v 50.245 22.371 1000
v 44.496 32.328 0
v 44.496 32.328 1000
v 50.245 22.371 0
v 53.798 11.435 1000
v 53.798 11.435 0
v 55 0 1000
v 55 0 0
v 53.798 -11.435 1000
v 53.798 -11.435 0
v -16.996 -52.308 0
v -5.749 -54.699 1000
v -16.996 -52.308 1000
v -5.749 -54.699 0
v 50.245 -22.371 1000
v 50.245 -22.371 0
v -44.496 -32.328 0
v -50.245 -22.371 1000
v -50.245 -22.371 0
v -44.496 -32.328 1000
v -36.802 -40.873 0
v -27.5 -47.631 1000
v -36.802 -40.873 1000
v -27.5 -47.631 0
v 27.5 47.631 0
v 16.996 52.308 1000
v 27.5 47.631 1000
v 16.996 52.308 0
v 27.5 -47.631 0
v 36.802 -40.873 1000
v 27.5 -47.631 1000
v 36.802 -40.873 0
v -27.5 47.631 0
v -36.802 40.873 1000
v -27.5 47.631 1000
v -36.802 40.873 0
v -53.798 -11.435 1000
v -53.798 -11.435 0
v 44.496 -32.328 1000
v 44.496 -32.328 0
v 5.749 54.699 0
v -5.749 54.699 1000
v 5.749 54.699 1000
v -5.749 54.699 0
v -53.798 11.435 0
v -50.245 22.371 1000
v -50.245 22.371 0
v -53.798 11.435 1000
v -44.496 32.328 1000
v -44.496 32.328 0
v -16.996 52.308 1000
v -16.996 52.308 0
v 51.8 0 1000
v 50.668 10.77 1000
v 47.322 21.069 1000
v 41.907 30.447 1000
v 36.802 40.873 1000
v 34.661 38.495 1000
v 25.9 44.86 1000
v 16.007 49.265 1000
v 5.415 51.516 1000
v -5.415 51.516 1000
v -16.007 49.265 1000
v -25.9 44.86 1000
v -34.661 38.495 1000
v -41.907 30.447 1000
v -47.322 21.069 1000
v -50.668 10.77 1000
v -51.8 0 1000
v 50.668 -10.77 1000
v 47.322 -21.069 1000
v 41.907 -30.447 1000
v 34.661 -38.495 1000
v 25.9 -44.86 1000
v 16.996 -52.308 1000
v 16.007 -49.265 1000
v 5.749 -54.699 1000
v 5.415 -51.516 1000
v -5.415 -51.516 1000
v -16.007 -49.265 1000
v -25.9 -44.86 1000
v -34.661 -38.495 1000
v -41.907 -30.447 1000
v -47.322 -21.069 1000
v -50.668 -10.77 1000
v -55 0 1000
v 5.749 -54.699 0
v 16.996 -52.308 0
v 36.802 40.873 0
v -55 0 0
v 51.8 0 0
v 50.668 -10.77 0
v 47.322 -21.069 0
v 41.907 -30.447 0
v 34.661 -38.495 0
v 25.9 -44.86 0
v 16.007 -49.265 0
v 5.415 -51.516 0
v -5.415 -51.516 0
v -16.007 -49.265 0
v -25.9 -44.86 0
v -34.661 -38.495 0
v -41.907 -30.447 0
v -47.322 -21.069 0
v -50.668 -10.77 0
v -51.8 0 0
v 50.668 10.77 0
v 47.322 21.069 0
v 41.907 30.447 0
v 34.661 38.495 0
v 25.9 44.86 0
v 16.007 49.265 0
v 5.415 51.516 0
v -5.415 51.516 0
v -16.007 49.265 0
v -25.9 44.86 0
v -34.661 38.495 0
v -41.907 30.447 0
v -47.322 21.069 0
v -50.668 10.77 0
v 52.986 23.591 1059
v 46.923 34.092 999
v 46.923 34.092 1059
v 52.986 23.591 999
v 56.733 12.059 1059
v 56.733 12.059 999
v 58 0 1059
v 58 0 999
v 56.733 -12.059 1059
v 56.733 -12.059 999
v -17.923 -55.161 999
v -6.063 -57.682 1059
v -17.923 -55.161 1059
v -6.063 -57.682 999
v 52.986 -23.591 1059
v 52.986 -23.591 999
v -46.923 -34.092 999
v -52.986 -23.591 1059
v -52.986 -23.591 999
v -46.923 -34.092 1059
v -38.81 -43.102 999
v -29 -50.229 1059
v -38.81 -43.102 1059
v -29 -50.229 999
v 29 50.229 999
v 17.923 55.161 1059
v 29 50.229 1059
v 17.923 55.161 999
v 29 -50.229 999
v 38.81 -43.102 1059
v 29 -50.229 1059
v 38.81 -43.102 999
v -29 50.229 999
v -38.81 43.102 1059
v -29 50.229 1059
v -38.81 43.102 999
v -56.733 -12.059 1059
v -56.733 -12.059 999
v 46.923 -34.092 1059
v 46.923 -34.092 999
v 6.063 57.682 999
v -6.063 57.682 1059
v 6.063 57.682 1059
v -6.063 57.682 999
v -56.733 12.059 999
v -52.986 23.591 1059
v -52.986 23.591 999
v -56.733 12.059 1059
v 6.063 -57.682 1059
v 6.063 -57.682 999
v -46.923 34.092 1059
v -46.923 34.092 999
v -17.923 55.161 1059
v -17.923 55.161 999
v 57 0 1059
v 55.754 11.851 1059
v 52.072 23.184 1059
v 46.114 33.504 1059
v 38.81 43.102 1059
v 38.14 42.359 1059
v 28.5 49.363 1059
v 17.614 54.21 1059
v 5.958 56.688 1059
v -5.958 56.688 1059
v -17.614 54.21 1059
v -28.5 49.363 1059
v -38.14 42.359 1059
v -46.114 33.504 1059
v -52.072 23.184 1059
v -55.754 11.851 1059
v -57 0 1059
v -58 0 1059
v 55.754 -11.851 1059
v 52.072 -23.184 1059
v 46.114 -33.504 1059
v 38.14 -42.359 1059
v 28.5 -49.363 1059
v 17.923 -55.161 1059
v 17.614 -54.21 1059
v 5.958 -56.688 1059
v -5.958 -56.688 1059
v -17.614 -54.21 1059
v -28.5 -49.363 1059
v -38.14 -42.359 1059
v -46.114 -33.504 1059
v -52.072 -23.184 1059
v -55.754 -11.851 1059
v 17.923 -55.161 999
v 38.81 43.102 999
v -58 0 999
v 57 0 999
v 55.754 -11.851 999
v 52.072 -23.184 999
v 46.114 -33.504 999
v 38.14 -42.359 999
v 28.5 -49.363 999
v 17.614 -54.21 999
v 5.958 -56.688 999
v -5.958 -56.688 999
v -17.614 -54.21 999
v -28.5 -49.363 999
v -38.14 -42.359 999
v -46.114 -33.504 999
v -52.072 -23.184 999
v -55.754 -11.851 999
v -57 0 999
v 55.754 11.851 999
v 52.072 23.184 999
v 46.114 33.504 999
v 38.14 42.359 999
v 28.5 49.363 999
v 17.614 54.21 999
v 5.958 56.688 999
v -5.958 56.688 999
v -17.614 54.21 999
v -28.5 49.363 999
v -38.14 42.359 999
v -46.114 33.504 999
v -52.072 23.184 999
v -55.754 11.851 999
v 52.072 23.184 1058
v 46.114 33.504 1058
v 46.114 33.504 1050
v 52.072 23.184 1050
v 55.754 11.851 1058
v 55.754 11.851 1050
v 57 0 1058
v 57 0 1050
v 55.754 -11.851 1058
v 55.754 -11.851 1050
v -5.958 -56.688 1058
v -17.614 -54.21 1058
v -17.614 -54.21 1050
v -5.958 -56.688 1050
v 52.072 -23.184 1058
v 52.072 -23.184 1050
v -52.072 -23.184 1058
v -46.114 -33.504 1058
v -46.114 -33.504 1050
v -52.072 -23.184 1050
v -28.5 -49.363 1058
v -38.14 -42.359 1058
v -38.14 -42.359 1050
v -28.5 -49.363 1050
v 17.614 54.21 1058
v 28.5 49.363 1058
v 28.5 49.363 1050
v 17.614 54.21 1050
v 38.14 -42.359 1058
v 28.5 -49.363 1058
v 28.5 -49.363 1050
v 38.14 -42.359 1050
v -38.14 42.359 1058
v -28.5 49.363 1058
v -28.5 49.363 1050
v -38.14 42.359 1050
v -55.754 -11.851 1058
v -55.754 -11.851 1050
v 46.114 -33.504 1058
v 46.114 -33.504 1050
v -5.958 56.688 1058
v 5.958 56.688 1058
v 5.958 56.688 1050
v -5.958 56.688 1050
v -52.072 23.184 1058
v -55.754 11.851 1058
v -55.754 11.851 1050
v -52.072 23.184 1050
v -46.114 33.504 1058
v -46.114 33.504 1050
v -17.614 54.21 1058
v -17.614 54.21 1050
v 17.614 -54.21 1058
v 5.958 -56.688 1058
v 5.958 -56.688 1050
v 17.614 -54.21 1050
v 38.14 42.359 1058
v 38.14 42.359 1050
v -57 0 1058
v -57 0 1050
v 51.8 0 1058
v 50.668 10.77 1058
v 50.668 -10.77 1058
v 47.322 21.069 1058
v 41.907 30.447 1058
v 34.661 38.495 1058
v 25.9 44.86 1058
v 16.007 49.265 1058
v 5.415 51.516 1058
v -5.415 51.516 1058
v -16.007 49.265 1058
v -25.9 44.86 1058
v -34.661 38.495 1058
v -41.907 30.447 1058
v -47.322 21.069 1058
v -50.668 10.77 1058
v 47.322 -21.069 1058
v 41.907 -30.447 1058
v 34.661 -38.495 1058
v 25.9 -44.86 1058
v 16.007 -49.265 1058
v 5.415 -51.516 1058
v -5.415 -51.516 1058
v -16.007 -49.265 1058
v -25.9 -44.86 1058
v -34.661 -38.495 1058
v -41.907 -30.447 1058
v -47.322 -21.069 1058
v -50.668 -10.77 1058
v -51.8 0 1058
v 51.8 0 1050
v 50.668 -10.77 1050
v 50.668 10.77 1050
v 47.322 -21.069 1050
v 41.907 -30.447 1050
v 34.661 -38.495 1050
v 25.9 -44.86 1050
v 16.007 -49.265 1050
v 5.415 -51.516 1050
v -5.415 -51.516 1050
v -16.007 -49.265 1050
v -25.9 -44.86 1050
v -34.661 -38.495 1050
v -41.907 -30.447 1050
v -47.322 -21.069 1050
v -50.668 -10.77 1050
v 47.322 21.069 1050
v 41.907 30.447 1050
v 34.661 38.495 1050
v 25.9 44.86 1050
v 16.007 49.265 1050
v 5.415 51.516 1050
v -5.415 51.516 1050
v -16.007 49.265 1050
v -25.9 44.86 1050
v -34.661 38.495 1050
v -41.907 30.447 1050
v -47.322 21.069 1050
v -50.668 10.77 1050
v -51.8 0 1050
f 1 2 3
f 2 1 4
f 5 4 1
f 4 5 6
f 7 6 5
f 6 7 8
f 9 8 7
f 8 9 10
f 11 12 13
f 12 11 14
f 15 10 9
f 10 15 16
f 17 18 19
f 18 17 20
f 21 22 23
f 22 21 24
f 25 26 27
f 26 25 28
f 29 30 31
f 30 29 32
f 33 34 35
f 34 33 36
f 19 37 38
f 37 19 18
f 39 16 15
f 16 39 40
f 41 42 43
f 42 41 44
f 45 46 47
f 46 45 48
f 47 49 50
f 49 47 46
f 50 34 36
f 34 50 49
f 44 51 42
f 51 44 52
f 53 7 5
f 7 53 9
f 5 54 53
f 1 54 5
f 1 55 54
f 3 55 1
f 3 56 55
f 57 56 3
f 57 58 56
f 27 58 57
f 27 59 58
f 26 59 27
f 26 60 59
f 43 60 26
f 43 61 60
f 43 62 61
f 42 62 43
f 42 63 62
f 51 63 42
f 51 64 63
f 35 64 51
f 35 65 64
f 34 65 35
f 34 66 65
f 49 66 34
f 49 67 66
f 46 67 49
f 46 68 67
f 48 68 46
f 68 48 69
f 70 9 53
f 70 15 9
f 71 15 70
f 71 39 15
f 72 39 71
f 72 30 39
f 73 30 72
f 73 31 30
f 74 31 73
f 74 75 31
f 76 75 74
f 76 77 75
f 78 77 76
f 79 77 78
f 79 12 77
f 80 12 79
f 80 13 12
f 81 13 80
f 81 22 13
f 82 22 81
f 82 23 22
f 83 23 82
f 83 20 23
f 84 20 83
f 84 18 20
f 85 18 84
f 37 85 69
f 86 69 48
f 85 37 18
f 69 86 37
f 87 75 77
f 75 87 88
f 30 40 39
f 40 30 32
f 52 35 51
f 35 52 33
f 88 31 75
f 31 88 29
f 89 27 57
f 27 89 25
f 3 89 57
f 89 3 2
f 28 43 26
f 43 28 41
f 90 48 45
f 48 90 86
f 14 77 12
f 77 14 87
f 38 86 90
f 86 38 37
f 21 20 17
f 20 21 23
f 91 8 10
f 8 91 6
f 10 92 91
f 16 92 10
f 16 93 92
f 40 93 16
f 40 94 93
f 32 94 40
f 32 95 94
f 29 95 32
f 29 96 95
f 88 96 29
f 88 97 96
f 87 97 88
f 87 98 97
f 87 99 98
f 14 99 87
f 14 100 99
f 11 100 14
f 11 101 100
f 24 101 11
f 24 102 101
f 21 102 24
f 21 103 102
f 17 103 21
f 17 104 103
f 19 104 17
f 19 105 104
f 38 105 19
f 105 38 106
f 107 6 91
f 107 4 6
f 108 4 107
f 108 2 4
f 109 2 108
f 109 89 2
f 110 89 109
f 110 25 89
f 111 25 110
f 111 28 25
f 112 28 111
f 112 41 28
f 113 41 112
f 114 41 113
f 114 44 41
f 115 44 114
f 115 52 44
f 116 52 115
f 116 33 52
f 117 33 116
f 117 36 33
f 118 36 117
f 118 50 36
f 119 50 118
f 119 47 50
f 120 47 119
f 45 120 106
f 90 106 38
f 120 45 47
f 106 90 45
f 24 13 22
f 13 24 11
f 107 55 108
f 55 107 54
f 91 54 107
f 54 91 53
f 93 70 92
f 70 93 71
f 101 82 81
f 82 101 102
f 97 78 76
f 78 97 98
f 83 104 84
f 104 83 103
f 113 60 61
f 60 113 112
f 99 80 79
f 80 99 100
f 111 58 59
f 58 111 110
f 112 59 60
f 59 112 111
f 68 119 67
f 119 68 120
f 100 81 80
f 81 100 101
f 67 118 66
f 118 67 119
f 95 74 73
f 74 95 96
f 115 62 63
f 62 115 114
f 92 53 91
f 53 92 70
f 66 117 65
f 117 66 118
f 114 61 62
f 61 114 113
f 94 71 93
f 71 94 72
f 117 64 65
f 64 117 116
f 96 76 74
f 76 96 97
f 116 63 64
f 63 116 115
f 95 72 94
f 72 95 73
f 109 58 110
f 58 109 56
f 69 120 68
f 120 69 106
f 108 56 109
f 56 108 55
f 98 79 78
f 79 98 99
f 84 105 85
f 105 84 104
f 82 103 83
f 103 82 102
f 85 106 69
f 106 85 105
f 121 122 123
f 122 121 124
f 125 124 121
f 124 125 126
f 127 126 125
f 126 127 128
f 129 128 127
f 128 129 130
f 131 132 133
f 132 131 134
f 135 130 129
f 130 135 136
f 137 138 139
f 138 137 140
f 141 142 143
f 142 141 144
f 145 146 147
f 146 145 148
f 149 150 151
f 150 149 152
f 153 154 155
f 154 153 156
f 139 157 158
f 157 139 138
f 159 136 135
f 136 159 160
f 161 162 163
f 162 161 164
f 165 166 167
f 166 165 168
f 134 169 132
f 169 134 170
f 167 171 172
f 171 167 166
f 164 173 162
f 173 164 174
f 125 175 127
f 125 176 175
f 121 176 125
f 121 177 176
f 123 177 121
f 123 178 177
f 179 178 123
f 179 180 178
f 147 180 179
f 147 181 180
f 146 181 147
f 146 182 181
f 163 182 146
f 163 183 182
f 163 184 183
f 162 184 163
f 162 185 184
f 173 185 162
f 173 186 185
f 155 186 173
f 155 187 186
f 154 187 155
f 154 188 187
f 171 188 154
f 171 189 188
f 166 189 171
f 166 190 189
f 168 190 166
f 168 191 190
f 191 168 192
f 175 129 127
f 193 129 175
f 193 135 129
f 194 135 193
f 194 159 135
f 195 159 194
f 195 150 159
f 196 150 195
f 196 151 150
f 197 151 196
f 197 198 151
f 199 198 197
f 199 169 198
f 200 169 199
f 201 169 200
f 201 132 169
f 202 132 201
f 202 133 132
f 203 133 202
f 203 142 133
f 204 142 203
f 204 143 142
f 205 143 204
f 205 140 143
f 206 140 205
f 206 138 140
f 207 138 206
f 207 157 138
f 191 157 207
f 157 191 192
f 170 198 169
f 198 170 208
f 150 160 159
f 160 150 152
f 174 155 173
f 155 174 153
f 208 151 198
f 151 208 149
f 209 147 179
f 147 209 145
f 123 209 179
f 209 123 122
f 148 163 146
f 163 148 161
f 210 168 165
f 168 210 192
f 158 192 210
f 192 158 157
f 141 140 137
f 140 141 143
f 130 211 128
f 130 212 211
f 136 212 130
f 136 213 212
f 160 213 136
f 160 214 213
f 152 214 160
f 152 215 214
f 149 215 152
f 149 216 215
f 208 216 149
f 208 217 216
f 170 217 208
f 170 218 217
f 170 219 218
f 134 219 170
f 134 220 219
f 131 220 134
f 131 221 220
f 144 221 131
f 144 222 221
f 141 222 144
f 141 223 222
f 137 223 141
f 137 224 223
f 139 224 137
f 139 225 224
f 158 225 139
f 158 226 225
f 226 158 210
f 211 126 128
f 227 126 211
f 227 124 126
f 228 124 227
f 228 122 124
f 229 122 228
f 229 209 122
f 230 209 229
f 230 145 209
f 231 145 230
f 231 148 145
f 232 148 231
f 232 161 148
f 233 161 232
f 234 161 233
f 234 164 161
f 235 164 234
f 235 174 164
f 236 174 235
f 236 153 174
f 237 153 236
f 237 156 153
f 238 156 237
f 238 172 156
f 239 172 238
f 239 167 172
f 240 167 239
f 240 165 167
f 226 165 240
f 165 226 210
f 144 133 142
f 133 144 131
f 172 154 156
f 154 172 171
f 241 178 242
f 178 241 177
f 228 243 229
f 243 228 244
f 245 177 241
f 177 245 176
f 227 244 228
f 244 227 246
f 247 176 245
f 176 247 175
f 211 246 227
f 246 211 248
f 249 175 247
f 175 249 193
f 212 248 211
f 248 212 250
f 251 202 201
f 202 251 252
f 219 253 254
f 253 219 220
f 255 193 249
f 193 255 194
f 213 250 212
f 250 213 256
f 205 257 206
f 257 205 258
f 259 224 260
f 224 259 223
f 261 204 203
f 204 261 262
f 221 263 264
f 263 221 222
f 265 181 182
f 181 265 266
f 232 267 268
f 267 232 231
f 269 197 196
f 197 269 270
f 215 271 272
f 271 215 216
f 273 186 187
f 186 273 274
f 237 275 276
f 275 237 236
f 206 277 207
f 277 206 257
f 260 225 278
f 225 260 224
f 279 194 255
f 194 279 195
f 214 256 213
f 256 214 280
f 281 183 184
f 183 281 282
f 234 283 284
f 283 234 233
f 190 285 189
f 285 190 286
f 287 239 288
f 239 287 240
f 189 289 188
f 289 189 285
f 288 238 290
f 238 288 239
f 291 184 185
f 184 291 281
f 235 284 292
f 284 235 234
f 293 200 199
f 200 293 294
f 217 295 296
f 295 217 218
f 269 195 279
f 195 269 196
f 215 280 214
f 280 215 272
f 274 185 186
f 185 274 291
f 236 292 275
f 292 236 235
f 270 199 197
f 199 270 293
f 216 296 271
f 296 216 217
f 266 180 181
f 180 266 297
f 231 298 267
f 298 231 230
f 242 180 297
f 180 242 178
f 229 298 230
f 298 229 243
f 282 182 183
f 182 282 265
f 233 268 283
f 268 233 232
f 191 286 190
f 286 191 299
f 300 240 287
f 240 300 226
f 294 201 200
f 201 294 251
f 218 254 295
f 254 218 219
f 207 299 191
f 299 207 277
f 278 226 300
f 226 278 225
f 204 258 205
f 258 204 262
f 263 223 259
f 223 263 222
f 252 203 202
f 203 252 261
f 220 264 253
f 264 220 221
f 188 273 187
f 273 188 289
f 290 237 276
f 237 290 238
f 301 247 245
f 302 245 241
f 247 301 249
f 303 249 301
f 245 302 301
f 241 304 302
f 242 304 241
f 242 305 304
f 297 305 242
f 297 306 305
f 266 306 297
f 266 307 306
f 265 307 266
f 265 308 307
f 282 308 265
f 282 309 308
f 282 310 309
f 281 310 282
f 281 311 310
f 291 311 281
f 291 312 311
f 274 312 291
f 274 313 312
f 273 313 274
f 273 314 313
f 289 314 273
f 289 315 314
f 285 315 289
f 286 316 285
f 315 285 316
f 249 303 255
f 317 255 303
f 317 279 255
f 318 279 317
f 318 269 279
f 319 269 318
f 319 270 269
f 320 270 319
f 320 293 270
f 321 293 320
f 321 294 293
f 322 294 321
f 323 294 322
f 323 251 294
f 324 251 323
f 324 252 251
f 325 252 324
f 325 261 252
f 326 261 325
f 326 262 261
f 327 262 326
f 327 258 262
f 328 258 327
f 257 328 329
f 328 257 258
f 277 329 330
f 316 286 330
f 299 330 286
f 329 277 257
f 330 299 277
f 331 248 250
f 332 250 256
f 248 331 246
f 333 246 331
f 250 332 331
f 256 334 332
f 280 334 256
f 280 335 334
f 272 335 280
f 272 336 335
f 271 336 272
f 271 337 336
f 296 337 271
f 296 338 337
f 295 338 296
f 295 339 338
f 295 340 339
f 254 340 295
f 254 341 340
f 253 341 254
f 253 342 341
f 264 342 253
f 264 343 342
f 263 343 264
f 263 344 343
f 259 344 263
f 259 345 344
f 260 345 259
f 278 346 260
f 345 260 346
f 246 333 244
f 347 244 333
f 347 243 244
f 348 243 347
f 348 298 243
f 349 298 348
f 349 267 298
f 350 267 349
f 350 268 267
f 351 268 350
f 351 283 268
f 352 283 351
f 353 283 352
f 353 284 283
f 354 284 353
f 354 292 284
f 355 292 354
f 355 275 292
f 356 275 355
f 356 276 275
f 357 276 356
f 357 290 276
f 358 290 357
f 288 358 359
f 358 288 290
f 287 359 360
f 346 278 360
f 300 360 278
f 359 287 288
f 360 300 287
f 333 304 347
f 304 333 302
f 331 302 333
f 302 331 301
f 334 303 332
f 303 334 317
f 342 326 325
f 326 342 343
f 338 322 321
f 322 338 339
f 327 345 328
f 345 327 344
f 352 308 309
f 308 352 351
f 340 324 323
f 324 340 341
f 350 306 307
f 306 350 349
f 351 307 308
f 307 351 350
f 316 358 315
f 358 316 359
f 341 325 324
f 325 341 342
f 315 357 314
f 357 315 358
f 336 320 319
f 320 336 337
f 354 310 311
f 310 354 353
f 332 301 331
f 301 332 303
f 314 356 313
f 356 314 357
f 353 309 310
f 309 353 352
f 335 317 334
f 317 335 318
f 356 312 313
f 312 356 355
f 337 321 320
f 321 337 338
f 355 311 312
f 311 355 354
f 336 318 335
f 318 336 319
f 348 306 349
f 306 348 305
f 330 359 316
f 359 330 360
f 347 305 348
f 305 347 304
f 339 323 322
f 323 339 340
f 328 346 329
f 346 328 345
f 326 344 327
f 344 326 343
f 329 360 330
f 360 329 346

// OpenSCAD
// Parameters
nominal_diameter_mm = 110; //[55:220:1]
length_mm = 1000; //[500:2000:10]
include_end_fitting = 1; //[0:1:1]
od_mm = 110; //[90:160:1]
wall_thickness_mm = 3.2; //[2:6.5:0.1]
socket_length_mm = 60; //[30:120:1]
socket_wall_extra_mm = 2.0; //[0.5:6.0:0.1]
socket_od_extra_mm = 6.0; //[2.0:16.0:0.5]
socket_stop_thickness_mm = 4.0; //[2.0:10.0:0.5]
socket_stop_length_mm = 8.0; //[4.0:20.0:0.5]
overlap_mm = 1.0; //[0.5:2.0:0.1]

// HT Pipe - complete geometry
module ht_pipe() {
  color([0.85, 0.85, 0.8]) { // PVC color
    // Pipe body
    difference() {
      cylinder(h=length_mm, r=od_mm/2, center=false);
      translate([0, 0, -overlap_mm/2])
        cylinder(h=length_mm + overlap_mm, r=od_mm/2 - wall_thickness_mm, center=false);
    }
    
    if (include_end_fitting) {
      // Socket fitting
      union() {
        // Socket shell
        difference() {
          translate([0, 0, length_mm - overlap_mm])
            cylinder(h=socket_length_mm, r=(od_mm + socket_od_extra_mm)/2, center=false);
          translate([0, 0, length_mm - overlap_mm - overlap_mm/2])
            cylinder(h=socket_length_mm + overlap_mm, r=od_mm/2 + socket_wall_extra_mm, center=false);
        }
        
        // Socket stop ring
        difference() {
          translate([0, 0, length_mm - overlap_mm + socket_length_mm - socket_stop_length_mm - overlap_mm])
            cylinder(h=socket_stop_length_mm, r=od_mm/2 + socket_wall_extra_mm, center=false);
          translate([0, 0, length_mm - overlap_mm + socket_length_mm - socket_stop_length_mm - overlap_mm - overlap_mm/2])
            cylinder(h=socket_stop_length_mm + overlap_mm, r=od_mm/2 - wall_thickness_mm, center=false);
        }
      }
    }
  }
}

// Assembly
module assembly() {
  ht_pipe();
}

assembly();
